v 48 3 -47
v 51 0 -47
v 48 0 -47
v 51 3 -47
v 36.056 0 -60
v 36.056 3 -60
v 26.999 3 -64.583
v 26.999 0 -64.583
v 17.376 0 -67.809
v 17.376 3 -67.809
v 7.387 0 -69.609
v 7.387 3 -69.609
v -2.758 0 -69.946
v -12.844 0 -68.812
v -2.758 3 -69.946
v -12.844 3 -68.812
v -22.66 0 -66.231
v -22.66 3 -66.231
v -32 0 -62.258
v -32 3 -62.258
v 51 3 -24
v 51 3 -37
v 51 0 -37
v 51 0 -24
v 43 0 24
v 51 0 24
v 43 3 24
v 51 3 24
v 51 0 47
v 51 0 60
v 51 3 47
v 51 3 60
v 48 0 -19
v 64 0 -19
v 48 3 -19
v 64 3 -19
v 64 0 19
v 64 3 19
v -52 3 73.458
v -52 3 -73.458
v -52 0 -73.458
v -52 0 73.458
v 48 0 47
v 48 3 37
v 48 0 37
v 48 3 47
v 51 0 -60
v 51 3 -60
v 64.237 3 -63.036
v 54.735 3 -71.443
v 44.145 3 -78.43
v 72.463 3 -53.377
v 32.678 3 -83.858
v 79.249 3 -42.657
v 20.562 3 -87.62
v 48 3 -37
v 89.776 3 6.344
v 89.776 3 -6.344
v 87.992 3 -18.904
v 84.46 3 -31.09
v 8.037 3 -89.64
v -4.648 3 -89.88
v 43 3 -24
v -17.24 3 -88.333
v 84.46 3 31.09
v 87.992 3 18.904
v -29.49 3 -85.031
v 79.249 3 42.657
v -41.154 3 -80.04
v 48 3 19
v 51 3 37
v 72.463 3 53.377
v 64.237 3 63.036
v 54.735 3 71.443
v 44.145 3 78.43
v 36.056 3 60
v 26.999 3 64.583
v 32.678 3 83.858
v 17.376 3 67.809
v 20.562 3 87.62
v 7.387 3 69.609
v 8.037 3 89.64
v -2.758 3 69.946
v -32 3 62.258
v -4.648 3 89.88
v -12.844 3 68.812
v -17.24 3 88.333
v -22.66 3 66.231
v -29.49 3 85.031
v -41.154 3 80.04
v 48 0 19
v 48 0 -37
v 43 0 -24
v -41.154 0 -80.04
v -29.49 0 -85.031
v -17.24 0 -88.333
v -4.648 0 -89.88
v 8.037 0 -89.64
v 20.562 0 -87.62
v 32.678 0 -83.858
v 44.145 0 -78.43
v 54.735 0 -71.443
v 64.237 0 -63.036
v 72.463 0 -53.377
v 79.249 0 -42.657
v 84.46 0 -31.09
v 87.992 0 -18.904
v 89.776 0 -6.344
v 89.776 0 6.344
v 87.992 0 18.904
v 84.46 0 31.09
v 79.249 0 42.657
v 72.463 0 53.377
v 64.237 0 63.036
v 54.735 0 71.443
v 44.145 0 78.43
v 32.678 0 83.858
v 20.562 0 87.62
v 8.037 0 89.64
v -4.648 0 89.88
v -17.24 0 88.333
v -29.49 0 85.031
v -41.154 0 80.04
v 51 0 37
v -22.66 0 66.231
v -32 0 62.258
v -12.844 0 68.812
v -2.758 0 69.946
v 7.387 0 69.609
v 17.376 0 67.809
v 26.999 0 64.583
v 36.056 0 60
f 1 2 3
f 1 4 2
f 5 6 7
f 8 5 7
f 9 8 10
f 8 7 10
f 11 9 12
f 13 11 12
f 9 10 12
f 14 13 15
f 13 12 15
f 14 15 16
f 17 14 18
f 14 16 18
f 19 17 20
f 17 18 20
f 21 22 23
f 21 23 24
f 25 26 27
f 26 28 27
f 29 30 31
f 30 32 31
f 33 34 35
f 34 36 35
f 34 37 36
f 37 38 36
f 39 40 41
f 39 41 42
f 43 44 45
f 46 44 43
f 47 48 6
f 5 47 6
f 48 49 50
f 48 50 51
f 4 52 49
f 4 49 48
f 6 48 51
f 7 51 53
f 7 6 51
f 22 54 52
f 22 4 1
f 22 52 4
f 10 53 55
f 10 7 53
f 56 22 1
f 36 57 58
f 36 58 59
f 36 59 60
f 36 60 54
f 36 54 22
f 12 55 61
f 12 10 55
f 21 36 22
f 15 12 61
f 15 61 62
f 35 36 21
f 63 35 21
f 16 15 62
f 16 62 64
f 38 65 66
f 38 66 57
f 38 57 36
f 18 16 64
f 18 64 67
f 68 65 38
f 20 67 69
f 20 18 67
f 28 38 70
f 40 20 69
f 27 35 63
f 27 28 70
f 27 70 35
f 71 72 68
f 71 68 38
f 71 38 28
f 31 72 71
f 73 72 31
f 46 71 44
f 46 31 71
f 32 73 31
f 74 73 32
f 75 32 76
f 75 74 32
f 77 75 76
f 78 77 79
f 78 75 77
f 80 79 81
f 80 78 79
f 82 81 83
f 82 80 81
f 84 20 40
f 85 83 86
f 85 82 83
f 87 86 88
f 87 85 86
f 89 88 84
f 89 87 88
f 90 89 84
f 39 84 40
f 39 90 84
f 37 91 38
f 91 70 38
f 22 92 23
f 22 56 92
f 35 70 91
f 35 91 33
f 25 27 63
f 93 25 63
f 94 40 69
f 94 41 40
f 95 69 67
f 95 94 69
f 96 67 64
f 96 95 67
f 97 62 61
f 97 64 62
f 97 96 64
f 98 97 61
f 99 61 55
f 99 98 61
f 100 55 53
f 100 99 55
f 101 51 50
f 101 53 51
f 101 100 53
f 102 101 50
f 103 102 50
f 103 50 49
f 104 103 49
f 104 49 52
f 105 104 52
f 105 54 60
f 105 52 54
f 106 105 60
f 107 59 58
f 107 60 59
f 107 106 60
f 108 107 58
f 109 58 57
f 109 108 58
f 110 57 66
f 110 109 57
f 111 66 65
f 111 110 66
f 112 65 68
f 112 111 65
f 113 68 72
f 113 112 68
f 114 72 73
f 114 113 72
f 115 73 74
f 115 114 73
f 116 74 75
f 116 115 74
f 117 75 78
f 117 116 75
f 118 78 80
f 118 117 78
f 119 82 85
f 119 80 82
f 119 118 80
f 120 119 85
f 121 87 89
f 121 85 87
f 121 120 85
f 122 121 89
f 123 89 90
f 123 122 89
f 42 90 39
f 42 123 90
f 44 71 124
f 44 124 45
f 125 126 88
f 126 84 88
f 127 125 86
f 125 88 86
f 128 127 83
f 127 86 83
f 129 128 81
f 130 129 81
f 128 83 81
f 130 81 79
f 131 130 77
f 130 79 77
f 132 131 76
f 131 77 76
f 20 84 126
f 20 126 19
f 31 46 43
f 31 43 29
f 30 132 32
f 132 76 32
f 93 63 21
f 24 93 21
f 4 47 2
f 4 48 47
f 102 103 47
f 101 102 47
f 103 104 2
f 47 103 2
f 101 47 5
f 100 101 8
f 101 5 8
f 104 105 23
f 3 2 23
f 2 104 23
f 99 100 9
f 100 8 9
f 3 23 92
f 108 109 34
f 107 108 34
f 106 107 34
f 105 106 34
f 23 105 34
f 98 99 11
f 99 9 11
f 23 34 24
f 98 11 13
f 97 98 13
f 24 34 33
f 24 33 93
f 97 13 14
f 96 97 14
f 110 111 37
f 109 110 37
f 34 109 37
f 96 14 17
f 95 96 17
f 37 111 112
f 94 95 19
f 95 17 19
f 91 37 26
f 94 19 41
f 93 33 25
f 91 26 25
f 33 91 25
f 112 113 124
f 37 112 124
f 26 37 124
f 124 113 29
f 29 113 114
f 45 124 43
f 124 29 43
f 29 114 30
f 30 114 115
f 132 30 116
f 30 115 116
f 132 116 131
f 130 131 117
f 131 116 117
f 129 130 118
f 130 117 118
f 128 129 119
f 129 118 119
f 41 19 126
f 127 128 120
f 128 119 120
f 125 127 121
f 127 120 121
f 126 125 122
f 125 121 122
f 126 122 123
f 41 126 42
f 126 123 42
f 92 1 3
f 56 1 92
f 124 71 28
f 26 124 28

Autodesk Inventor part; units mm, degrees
ref_plane "YZ Plane" through (0, 0, 0) normal (1, 0, 0) x (0, 1, 0)
ref_plane "XZ Plane" through (0, 0, 0) normal (0, 1, 0) x (-1, 0, 0)
ref_plane "XY Plane" through (0, 0, 0) normal (0, 0, 1) x (1, 0, 0)
sketch "Sketch1" plane through (0, 0, 0) normal (0, 1, 0) x (-1, 0, 0)
  circle A0 centre (0, 0) radius 90
  line L0 (55, -71.239) -> (55, 71.239)
  dimension "d0" = 180
  dimension "d1" = 55
extrude "Extrusion1" add sketch "Sketch1" along normal blind 3 contours L0 A0 picked at (6.6667, 0)
sketch "Sketch2" plane through (0, 3, 0) normal (0, 1, 0) x (1, 0, 0)
  arc A0 (-55, -71.239) -> (-55, 71.239) centre (0, 0) ccw projected
  line L0 (-52, 73.4575) -> (-52, -73.4575)
  line L1 (-55, 71.239) -> (-55, -71.239) projected
  dimension "d4" = 3
extrude "Extrusion2" cut sketch "Sketch2" against normal blind 3 contours L1 A0 L0
sketch "Sketch3" plane through (0, 3, 0) normal (0, 1, 0) x (1, 0, 0)
  line L0 (-52, 73.4575) -> (-52, -73.4575) projected
  arc A0 (-52, -73.4575) -> (-52, 73.4575) centre (0, 0) ccw projected
  line L1 (-32, -62.2575) -> (-32, 62.2575)
  arc A1 (-32, -62.2575) -> (-32, 62.2575) centre (0, 0) ccw
  dimension "d7" = 20
extrude "Extrusion3" cut sketch "Sketch3" against normal blind 3 contours L1 A1
sketch "Sketch4" plane through (0, 3, 0) normal (0, 1, 0) x (1, 0, 0)
  arc A0 (-32, -62.2575) -> (-32, 62.2575) centre (0, 0) ccw projected
  line L0 (51, -47.9479) -> (76.1643, -47.9479)
  line L1 (76.1643, -47.9479) -> (76.1643, 47.9479)
  line L2 (76.1643, 47.9479) -> (51, 47.9479)
  line L3 (51, 47.9479) -> (51, -47.9479)
  line L4 (-52, 73.4575) -> (-52, -73.4575) projected
  arc A1 (-52, -73.4575) -> (-52, 73.4575) centre (0, 0) ccw projected
  dimension "d10" = 103
extrude "Extrusion4" add sketch "Sketch4" against normal blind 3 contours L3 A0
sketch "Sketch5" plane through (0, 3, 0) normal (0, 1, 0) x (1, 0, 0)
  line L0 (48, -19) -> (64, -19)
  line L1 (64, -19) -> (64, 19)
  line L2 (64, 19) -> (48, 19)
  line L3 (48, 19) -> (48, -19)
  line L4 (-52, 73.4575) -> (-52, -73.4575) projected
  point P0 (0, 0)
  point P1 (64, 0)
  dimension "d13" = 16
  dimension "d14" = 38
  dimension "d15" = 100
extrude "Extrusion5" cut sketch "Sketch5" against normal blind 3
sketch "Sketch6" plane through (0, 3, 0) normal (0, 1, 0) x (1, 0, 0)
  line L0 (64, -24) -> (43, -24)
  line L1 (43, -24) -> (43, 24)
  line L2 (43, 24) -> (64, 24)
  line L3 (64, 24) -> (64, -24)
  line L4 (-52, 73.4575) -> (-52, -73.4575) projected
  arc A0 (-52, -73.4575) -> (-52, 73.4575) centre (0, 0) ccw projected
  line L5 (51, 19) -> (64, 19) projected
  line L6 (64, 19) -> (64, -19) projected
  line L7 (64, -19) -> (51, -19) projected
  line L8 (51, -19) -> (51, -47.9479) projected
  arc A1 (-32, -62.2575) -> (51, -47.9479) centre (0, 0) ccw projected
  line L9 (-32, -62.2575) -> (-32, 62.2575) projected
  arc A2 (51, 47.9479) -> (-32, 62.2575) centre (0, 0) ccw projected
  line L10 (51, 47.9479) -> (51, 19) projected
  line L11 (64, -19) -> (48, -19)
  line L12 (48, -19) -> (48, 19)
  line L13 (48, 19) -> (64, 19)
  line L14 (64, 19) -> (64, -19)
  line L15 (51, 19) -> (64, 19) projected
  line L16 (64, 19) -> (64, -19) projected
  dimension "d18" = 5
  dimension "d19" = 5
  dimension "d20" = 8
  dimension "d21" = 16
extrude "Extrusion6" add sketch "Sketch6" against normal blind 3 contours L0 L8 L7 L3 | L0 L1 L2 L10 L13 L12 L11 L8 | L5 L10 L2 L3
sketch "Sketch7" plane through (0, 3, 0) normal (0, 1, 0) x (1, 0, 0)
  line L0 (43, 24) -> (51, 24) projected
  line L1 (48, 24) -> (51, 24)
  line L2 (51, 24) -> (51, 60)
  line L3 (51, 60) -> (48, 60)
  line L4 (48, 60) -> (48, 24)
  line L5 (51, 47.9479) -> (51, 24) projected
  line L6 (48, 60) -> (36.0555, 60)
  line L7 (36.0555, 60) -> (36.0555, 50.951)
  line L8 (36.0555, 50.951) -> (48, 50.951)
  line L9 (48, 50.951) -> (48, 60)
  arc A0 (51, 47.9479) -> (-32, 62.2575) centre (0, 0) ccw projected
  dimension "d24" = 3
  dimension "d25" = 36
extrude "Extrusion7" cut sketch "Sketch7" against normal blind 3
sketch "Sketch8" plane through (0, 3, 0) normal (0, 1, 0) x (1, 0, 0)
  line L0 (51, 60) -> (51, 24) projected
  line L1 (51, 47) -> (48, 47)
  line L2 (48, 47) -> (48, 37)
  line L3 (48, 37) -> (51, 37)
  line L4 (51, 37) -> (51, 47)
  line L5 (36.0555, 60) -> (51, 60) projected
  point P0 (0, 0)
  dimension "d28" = 3
  dimension "d29" = 10
  dimension "d30" = 13
extrude "Extrusion8" add sketch "Sketch8" against normal blind 3
mirror "Mirror1" about plane through (0, 0, 0) normal (0, 0, 1) of "Extrusion8", "Extrusion7"
equation "\"d19\" = d18"
properties part number "suport plate"
